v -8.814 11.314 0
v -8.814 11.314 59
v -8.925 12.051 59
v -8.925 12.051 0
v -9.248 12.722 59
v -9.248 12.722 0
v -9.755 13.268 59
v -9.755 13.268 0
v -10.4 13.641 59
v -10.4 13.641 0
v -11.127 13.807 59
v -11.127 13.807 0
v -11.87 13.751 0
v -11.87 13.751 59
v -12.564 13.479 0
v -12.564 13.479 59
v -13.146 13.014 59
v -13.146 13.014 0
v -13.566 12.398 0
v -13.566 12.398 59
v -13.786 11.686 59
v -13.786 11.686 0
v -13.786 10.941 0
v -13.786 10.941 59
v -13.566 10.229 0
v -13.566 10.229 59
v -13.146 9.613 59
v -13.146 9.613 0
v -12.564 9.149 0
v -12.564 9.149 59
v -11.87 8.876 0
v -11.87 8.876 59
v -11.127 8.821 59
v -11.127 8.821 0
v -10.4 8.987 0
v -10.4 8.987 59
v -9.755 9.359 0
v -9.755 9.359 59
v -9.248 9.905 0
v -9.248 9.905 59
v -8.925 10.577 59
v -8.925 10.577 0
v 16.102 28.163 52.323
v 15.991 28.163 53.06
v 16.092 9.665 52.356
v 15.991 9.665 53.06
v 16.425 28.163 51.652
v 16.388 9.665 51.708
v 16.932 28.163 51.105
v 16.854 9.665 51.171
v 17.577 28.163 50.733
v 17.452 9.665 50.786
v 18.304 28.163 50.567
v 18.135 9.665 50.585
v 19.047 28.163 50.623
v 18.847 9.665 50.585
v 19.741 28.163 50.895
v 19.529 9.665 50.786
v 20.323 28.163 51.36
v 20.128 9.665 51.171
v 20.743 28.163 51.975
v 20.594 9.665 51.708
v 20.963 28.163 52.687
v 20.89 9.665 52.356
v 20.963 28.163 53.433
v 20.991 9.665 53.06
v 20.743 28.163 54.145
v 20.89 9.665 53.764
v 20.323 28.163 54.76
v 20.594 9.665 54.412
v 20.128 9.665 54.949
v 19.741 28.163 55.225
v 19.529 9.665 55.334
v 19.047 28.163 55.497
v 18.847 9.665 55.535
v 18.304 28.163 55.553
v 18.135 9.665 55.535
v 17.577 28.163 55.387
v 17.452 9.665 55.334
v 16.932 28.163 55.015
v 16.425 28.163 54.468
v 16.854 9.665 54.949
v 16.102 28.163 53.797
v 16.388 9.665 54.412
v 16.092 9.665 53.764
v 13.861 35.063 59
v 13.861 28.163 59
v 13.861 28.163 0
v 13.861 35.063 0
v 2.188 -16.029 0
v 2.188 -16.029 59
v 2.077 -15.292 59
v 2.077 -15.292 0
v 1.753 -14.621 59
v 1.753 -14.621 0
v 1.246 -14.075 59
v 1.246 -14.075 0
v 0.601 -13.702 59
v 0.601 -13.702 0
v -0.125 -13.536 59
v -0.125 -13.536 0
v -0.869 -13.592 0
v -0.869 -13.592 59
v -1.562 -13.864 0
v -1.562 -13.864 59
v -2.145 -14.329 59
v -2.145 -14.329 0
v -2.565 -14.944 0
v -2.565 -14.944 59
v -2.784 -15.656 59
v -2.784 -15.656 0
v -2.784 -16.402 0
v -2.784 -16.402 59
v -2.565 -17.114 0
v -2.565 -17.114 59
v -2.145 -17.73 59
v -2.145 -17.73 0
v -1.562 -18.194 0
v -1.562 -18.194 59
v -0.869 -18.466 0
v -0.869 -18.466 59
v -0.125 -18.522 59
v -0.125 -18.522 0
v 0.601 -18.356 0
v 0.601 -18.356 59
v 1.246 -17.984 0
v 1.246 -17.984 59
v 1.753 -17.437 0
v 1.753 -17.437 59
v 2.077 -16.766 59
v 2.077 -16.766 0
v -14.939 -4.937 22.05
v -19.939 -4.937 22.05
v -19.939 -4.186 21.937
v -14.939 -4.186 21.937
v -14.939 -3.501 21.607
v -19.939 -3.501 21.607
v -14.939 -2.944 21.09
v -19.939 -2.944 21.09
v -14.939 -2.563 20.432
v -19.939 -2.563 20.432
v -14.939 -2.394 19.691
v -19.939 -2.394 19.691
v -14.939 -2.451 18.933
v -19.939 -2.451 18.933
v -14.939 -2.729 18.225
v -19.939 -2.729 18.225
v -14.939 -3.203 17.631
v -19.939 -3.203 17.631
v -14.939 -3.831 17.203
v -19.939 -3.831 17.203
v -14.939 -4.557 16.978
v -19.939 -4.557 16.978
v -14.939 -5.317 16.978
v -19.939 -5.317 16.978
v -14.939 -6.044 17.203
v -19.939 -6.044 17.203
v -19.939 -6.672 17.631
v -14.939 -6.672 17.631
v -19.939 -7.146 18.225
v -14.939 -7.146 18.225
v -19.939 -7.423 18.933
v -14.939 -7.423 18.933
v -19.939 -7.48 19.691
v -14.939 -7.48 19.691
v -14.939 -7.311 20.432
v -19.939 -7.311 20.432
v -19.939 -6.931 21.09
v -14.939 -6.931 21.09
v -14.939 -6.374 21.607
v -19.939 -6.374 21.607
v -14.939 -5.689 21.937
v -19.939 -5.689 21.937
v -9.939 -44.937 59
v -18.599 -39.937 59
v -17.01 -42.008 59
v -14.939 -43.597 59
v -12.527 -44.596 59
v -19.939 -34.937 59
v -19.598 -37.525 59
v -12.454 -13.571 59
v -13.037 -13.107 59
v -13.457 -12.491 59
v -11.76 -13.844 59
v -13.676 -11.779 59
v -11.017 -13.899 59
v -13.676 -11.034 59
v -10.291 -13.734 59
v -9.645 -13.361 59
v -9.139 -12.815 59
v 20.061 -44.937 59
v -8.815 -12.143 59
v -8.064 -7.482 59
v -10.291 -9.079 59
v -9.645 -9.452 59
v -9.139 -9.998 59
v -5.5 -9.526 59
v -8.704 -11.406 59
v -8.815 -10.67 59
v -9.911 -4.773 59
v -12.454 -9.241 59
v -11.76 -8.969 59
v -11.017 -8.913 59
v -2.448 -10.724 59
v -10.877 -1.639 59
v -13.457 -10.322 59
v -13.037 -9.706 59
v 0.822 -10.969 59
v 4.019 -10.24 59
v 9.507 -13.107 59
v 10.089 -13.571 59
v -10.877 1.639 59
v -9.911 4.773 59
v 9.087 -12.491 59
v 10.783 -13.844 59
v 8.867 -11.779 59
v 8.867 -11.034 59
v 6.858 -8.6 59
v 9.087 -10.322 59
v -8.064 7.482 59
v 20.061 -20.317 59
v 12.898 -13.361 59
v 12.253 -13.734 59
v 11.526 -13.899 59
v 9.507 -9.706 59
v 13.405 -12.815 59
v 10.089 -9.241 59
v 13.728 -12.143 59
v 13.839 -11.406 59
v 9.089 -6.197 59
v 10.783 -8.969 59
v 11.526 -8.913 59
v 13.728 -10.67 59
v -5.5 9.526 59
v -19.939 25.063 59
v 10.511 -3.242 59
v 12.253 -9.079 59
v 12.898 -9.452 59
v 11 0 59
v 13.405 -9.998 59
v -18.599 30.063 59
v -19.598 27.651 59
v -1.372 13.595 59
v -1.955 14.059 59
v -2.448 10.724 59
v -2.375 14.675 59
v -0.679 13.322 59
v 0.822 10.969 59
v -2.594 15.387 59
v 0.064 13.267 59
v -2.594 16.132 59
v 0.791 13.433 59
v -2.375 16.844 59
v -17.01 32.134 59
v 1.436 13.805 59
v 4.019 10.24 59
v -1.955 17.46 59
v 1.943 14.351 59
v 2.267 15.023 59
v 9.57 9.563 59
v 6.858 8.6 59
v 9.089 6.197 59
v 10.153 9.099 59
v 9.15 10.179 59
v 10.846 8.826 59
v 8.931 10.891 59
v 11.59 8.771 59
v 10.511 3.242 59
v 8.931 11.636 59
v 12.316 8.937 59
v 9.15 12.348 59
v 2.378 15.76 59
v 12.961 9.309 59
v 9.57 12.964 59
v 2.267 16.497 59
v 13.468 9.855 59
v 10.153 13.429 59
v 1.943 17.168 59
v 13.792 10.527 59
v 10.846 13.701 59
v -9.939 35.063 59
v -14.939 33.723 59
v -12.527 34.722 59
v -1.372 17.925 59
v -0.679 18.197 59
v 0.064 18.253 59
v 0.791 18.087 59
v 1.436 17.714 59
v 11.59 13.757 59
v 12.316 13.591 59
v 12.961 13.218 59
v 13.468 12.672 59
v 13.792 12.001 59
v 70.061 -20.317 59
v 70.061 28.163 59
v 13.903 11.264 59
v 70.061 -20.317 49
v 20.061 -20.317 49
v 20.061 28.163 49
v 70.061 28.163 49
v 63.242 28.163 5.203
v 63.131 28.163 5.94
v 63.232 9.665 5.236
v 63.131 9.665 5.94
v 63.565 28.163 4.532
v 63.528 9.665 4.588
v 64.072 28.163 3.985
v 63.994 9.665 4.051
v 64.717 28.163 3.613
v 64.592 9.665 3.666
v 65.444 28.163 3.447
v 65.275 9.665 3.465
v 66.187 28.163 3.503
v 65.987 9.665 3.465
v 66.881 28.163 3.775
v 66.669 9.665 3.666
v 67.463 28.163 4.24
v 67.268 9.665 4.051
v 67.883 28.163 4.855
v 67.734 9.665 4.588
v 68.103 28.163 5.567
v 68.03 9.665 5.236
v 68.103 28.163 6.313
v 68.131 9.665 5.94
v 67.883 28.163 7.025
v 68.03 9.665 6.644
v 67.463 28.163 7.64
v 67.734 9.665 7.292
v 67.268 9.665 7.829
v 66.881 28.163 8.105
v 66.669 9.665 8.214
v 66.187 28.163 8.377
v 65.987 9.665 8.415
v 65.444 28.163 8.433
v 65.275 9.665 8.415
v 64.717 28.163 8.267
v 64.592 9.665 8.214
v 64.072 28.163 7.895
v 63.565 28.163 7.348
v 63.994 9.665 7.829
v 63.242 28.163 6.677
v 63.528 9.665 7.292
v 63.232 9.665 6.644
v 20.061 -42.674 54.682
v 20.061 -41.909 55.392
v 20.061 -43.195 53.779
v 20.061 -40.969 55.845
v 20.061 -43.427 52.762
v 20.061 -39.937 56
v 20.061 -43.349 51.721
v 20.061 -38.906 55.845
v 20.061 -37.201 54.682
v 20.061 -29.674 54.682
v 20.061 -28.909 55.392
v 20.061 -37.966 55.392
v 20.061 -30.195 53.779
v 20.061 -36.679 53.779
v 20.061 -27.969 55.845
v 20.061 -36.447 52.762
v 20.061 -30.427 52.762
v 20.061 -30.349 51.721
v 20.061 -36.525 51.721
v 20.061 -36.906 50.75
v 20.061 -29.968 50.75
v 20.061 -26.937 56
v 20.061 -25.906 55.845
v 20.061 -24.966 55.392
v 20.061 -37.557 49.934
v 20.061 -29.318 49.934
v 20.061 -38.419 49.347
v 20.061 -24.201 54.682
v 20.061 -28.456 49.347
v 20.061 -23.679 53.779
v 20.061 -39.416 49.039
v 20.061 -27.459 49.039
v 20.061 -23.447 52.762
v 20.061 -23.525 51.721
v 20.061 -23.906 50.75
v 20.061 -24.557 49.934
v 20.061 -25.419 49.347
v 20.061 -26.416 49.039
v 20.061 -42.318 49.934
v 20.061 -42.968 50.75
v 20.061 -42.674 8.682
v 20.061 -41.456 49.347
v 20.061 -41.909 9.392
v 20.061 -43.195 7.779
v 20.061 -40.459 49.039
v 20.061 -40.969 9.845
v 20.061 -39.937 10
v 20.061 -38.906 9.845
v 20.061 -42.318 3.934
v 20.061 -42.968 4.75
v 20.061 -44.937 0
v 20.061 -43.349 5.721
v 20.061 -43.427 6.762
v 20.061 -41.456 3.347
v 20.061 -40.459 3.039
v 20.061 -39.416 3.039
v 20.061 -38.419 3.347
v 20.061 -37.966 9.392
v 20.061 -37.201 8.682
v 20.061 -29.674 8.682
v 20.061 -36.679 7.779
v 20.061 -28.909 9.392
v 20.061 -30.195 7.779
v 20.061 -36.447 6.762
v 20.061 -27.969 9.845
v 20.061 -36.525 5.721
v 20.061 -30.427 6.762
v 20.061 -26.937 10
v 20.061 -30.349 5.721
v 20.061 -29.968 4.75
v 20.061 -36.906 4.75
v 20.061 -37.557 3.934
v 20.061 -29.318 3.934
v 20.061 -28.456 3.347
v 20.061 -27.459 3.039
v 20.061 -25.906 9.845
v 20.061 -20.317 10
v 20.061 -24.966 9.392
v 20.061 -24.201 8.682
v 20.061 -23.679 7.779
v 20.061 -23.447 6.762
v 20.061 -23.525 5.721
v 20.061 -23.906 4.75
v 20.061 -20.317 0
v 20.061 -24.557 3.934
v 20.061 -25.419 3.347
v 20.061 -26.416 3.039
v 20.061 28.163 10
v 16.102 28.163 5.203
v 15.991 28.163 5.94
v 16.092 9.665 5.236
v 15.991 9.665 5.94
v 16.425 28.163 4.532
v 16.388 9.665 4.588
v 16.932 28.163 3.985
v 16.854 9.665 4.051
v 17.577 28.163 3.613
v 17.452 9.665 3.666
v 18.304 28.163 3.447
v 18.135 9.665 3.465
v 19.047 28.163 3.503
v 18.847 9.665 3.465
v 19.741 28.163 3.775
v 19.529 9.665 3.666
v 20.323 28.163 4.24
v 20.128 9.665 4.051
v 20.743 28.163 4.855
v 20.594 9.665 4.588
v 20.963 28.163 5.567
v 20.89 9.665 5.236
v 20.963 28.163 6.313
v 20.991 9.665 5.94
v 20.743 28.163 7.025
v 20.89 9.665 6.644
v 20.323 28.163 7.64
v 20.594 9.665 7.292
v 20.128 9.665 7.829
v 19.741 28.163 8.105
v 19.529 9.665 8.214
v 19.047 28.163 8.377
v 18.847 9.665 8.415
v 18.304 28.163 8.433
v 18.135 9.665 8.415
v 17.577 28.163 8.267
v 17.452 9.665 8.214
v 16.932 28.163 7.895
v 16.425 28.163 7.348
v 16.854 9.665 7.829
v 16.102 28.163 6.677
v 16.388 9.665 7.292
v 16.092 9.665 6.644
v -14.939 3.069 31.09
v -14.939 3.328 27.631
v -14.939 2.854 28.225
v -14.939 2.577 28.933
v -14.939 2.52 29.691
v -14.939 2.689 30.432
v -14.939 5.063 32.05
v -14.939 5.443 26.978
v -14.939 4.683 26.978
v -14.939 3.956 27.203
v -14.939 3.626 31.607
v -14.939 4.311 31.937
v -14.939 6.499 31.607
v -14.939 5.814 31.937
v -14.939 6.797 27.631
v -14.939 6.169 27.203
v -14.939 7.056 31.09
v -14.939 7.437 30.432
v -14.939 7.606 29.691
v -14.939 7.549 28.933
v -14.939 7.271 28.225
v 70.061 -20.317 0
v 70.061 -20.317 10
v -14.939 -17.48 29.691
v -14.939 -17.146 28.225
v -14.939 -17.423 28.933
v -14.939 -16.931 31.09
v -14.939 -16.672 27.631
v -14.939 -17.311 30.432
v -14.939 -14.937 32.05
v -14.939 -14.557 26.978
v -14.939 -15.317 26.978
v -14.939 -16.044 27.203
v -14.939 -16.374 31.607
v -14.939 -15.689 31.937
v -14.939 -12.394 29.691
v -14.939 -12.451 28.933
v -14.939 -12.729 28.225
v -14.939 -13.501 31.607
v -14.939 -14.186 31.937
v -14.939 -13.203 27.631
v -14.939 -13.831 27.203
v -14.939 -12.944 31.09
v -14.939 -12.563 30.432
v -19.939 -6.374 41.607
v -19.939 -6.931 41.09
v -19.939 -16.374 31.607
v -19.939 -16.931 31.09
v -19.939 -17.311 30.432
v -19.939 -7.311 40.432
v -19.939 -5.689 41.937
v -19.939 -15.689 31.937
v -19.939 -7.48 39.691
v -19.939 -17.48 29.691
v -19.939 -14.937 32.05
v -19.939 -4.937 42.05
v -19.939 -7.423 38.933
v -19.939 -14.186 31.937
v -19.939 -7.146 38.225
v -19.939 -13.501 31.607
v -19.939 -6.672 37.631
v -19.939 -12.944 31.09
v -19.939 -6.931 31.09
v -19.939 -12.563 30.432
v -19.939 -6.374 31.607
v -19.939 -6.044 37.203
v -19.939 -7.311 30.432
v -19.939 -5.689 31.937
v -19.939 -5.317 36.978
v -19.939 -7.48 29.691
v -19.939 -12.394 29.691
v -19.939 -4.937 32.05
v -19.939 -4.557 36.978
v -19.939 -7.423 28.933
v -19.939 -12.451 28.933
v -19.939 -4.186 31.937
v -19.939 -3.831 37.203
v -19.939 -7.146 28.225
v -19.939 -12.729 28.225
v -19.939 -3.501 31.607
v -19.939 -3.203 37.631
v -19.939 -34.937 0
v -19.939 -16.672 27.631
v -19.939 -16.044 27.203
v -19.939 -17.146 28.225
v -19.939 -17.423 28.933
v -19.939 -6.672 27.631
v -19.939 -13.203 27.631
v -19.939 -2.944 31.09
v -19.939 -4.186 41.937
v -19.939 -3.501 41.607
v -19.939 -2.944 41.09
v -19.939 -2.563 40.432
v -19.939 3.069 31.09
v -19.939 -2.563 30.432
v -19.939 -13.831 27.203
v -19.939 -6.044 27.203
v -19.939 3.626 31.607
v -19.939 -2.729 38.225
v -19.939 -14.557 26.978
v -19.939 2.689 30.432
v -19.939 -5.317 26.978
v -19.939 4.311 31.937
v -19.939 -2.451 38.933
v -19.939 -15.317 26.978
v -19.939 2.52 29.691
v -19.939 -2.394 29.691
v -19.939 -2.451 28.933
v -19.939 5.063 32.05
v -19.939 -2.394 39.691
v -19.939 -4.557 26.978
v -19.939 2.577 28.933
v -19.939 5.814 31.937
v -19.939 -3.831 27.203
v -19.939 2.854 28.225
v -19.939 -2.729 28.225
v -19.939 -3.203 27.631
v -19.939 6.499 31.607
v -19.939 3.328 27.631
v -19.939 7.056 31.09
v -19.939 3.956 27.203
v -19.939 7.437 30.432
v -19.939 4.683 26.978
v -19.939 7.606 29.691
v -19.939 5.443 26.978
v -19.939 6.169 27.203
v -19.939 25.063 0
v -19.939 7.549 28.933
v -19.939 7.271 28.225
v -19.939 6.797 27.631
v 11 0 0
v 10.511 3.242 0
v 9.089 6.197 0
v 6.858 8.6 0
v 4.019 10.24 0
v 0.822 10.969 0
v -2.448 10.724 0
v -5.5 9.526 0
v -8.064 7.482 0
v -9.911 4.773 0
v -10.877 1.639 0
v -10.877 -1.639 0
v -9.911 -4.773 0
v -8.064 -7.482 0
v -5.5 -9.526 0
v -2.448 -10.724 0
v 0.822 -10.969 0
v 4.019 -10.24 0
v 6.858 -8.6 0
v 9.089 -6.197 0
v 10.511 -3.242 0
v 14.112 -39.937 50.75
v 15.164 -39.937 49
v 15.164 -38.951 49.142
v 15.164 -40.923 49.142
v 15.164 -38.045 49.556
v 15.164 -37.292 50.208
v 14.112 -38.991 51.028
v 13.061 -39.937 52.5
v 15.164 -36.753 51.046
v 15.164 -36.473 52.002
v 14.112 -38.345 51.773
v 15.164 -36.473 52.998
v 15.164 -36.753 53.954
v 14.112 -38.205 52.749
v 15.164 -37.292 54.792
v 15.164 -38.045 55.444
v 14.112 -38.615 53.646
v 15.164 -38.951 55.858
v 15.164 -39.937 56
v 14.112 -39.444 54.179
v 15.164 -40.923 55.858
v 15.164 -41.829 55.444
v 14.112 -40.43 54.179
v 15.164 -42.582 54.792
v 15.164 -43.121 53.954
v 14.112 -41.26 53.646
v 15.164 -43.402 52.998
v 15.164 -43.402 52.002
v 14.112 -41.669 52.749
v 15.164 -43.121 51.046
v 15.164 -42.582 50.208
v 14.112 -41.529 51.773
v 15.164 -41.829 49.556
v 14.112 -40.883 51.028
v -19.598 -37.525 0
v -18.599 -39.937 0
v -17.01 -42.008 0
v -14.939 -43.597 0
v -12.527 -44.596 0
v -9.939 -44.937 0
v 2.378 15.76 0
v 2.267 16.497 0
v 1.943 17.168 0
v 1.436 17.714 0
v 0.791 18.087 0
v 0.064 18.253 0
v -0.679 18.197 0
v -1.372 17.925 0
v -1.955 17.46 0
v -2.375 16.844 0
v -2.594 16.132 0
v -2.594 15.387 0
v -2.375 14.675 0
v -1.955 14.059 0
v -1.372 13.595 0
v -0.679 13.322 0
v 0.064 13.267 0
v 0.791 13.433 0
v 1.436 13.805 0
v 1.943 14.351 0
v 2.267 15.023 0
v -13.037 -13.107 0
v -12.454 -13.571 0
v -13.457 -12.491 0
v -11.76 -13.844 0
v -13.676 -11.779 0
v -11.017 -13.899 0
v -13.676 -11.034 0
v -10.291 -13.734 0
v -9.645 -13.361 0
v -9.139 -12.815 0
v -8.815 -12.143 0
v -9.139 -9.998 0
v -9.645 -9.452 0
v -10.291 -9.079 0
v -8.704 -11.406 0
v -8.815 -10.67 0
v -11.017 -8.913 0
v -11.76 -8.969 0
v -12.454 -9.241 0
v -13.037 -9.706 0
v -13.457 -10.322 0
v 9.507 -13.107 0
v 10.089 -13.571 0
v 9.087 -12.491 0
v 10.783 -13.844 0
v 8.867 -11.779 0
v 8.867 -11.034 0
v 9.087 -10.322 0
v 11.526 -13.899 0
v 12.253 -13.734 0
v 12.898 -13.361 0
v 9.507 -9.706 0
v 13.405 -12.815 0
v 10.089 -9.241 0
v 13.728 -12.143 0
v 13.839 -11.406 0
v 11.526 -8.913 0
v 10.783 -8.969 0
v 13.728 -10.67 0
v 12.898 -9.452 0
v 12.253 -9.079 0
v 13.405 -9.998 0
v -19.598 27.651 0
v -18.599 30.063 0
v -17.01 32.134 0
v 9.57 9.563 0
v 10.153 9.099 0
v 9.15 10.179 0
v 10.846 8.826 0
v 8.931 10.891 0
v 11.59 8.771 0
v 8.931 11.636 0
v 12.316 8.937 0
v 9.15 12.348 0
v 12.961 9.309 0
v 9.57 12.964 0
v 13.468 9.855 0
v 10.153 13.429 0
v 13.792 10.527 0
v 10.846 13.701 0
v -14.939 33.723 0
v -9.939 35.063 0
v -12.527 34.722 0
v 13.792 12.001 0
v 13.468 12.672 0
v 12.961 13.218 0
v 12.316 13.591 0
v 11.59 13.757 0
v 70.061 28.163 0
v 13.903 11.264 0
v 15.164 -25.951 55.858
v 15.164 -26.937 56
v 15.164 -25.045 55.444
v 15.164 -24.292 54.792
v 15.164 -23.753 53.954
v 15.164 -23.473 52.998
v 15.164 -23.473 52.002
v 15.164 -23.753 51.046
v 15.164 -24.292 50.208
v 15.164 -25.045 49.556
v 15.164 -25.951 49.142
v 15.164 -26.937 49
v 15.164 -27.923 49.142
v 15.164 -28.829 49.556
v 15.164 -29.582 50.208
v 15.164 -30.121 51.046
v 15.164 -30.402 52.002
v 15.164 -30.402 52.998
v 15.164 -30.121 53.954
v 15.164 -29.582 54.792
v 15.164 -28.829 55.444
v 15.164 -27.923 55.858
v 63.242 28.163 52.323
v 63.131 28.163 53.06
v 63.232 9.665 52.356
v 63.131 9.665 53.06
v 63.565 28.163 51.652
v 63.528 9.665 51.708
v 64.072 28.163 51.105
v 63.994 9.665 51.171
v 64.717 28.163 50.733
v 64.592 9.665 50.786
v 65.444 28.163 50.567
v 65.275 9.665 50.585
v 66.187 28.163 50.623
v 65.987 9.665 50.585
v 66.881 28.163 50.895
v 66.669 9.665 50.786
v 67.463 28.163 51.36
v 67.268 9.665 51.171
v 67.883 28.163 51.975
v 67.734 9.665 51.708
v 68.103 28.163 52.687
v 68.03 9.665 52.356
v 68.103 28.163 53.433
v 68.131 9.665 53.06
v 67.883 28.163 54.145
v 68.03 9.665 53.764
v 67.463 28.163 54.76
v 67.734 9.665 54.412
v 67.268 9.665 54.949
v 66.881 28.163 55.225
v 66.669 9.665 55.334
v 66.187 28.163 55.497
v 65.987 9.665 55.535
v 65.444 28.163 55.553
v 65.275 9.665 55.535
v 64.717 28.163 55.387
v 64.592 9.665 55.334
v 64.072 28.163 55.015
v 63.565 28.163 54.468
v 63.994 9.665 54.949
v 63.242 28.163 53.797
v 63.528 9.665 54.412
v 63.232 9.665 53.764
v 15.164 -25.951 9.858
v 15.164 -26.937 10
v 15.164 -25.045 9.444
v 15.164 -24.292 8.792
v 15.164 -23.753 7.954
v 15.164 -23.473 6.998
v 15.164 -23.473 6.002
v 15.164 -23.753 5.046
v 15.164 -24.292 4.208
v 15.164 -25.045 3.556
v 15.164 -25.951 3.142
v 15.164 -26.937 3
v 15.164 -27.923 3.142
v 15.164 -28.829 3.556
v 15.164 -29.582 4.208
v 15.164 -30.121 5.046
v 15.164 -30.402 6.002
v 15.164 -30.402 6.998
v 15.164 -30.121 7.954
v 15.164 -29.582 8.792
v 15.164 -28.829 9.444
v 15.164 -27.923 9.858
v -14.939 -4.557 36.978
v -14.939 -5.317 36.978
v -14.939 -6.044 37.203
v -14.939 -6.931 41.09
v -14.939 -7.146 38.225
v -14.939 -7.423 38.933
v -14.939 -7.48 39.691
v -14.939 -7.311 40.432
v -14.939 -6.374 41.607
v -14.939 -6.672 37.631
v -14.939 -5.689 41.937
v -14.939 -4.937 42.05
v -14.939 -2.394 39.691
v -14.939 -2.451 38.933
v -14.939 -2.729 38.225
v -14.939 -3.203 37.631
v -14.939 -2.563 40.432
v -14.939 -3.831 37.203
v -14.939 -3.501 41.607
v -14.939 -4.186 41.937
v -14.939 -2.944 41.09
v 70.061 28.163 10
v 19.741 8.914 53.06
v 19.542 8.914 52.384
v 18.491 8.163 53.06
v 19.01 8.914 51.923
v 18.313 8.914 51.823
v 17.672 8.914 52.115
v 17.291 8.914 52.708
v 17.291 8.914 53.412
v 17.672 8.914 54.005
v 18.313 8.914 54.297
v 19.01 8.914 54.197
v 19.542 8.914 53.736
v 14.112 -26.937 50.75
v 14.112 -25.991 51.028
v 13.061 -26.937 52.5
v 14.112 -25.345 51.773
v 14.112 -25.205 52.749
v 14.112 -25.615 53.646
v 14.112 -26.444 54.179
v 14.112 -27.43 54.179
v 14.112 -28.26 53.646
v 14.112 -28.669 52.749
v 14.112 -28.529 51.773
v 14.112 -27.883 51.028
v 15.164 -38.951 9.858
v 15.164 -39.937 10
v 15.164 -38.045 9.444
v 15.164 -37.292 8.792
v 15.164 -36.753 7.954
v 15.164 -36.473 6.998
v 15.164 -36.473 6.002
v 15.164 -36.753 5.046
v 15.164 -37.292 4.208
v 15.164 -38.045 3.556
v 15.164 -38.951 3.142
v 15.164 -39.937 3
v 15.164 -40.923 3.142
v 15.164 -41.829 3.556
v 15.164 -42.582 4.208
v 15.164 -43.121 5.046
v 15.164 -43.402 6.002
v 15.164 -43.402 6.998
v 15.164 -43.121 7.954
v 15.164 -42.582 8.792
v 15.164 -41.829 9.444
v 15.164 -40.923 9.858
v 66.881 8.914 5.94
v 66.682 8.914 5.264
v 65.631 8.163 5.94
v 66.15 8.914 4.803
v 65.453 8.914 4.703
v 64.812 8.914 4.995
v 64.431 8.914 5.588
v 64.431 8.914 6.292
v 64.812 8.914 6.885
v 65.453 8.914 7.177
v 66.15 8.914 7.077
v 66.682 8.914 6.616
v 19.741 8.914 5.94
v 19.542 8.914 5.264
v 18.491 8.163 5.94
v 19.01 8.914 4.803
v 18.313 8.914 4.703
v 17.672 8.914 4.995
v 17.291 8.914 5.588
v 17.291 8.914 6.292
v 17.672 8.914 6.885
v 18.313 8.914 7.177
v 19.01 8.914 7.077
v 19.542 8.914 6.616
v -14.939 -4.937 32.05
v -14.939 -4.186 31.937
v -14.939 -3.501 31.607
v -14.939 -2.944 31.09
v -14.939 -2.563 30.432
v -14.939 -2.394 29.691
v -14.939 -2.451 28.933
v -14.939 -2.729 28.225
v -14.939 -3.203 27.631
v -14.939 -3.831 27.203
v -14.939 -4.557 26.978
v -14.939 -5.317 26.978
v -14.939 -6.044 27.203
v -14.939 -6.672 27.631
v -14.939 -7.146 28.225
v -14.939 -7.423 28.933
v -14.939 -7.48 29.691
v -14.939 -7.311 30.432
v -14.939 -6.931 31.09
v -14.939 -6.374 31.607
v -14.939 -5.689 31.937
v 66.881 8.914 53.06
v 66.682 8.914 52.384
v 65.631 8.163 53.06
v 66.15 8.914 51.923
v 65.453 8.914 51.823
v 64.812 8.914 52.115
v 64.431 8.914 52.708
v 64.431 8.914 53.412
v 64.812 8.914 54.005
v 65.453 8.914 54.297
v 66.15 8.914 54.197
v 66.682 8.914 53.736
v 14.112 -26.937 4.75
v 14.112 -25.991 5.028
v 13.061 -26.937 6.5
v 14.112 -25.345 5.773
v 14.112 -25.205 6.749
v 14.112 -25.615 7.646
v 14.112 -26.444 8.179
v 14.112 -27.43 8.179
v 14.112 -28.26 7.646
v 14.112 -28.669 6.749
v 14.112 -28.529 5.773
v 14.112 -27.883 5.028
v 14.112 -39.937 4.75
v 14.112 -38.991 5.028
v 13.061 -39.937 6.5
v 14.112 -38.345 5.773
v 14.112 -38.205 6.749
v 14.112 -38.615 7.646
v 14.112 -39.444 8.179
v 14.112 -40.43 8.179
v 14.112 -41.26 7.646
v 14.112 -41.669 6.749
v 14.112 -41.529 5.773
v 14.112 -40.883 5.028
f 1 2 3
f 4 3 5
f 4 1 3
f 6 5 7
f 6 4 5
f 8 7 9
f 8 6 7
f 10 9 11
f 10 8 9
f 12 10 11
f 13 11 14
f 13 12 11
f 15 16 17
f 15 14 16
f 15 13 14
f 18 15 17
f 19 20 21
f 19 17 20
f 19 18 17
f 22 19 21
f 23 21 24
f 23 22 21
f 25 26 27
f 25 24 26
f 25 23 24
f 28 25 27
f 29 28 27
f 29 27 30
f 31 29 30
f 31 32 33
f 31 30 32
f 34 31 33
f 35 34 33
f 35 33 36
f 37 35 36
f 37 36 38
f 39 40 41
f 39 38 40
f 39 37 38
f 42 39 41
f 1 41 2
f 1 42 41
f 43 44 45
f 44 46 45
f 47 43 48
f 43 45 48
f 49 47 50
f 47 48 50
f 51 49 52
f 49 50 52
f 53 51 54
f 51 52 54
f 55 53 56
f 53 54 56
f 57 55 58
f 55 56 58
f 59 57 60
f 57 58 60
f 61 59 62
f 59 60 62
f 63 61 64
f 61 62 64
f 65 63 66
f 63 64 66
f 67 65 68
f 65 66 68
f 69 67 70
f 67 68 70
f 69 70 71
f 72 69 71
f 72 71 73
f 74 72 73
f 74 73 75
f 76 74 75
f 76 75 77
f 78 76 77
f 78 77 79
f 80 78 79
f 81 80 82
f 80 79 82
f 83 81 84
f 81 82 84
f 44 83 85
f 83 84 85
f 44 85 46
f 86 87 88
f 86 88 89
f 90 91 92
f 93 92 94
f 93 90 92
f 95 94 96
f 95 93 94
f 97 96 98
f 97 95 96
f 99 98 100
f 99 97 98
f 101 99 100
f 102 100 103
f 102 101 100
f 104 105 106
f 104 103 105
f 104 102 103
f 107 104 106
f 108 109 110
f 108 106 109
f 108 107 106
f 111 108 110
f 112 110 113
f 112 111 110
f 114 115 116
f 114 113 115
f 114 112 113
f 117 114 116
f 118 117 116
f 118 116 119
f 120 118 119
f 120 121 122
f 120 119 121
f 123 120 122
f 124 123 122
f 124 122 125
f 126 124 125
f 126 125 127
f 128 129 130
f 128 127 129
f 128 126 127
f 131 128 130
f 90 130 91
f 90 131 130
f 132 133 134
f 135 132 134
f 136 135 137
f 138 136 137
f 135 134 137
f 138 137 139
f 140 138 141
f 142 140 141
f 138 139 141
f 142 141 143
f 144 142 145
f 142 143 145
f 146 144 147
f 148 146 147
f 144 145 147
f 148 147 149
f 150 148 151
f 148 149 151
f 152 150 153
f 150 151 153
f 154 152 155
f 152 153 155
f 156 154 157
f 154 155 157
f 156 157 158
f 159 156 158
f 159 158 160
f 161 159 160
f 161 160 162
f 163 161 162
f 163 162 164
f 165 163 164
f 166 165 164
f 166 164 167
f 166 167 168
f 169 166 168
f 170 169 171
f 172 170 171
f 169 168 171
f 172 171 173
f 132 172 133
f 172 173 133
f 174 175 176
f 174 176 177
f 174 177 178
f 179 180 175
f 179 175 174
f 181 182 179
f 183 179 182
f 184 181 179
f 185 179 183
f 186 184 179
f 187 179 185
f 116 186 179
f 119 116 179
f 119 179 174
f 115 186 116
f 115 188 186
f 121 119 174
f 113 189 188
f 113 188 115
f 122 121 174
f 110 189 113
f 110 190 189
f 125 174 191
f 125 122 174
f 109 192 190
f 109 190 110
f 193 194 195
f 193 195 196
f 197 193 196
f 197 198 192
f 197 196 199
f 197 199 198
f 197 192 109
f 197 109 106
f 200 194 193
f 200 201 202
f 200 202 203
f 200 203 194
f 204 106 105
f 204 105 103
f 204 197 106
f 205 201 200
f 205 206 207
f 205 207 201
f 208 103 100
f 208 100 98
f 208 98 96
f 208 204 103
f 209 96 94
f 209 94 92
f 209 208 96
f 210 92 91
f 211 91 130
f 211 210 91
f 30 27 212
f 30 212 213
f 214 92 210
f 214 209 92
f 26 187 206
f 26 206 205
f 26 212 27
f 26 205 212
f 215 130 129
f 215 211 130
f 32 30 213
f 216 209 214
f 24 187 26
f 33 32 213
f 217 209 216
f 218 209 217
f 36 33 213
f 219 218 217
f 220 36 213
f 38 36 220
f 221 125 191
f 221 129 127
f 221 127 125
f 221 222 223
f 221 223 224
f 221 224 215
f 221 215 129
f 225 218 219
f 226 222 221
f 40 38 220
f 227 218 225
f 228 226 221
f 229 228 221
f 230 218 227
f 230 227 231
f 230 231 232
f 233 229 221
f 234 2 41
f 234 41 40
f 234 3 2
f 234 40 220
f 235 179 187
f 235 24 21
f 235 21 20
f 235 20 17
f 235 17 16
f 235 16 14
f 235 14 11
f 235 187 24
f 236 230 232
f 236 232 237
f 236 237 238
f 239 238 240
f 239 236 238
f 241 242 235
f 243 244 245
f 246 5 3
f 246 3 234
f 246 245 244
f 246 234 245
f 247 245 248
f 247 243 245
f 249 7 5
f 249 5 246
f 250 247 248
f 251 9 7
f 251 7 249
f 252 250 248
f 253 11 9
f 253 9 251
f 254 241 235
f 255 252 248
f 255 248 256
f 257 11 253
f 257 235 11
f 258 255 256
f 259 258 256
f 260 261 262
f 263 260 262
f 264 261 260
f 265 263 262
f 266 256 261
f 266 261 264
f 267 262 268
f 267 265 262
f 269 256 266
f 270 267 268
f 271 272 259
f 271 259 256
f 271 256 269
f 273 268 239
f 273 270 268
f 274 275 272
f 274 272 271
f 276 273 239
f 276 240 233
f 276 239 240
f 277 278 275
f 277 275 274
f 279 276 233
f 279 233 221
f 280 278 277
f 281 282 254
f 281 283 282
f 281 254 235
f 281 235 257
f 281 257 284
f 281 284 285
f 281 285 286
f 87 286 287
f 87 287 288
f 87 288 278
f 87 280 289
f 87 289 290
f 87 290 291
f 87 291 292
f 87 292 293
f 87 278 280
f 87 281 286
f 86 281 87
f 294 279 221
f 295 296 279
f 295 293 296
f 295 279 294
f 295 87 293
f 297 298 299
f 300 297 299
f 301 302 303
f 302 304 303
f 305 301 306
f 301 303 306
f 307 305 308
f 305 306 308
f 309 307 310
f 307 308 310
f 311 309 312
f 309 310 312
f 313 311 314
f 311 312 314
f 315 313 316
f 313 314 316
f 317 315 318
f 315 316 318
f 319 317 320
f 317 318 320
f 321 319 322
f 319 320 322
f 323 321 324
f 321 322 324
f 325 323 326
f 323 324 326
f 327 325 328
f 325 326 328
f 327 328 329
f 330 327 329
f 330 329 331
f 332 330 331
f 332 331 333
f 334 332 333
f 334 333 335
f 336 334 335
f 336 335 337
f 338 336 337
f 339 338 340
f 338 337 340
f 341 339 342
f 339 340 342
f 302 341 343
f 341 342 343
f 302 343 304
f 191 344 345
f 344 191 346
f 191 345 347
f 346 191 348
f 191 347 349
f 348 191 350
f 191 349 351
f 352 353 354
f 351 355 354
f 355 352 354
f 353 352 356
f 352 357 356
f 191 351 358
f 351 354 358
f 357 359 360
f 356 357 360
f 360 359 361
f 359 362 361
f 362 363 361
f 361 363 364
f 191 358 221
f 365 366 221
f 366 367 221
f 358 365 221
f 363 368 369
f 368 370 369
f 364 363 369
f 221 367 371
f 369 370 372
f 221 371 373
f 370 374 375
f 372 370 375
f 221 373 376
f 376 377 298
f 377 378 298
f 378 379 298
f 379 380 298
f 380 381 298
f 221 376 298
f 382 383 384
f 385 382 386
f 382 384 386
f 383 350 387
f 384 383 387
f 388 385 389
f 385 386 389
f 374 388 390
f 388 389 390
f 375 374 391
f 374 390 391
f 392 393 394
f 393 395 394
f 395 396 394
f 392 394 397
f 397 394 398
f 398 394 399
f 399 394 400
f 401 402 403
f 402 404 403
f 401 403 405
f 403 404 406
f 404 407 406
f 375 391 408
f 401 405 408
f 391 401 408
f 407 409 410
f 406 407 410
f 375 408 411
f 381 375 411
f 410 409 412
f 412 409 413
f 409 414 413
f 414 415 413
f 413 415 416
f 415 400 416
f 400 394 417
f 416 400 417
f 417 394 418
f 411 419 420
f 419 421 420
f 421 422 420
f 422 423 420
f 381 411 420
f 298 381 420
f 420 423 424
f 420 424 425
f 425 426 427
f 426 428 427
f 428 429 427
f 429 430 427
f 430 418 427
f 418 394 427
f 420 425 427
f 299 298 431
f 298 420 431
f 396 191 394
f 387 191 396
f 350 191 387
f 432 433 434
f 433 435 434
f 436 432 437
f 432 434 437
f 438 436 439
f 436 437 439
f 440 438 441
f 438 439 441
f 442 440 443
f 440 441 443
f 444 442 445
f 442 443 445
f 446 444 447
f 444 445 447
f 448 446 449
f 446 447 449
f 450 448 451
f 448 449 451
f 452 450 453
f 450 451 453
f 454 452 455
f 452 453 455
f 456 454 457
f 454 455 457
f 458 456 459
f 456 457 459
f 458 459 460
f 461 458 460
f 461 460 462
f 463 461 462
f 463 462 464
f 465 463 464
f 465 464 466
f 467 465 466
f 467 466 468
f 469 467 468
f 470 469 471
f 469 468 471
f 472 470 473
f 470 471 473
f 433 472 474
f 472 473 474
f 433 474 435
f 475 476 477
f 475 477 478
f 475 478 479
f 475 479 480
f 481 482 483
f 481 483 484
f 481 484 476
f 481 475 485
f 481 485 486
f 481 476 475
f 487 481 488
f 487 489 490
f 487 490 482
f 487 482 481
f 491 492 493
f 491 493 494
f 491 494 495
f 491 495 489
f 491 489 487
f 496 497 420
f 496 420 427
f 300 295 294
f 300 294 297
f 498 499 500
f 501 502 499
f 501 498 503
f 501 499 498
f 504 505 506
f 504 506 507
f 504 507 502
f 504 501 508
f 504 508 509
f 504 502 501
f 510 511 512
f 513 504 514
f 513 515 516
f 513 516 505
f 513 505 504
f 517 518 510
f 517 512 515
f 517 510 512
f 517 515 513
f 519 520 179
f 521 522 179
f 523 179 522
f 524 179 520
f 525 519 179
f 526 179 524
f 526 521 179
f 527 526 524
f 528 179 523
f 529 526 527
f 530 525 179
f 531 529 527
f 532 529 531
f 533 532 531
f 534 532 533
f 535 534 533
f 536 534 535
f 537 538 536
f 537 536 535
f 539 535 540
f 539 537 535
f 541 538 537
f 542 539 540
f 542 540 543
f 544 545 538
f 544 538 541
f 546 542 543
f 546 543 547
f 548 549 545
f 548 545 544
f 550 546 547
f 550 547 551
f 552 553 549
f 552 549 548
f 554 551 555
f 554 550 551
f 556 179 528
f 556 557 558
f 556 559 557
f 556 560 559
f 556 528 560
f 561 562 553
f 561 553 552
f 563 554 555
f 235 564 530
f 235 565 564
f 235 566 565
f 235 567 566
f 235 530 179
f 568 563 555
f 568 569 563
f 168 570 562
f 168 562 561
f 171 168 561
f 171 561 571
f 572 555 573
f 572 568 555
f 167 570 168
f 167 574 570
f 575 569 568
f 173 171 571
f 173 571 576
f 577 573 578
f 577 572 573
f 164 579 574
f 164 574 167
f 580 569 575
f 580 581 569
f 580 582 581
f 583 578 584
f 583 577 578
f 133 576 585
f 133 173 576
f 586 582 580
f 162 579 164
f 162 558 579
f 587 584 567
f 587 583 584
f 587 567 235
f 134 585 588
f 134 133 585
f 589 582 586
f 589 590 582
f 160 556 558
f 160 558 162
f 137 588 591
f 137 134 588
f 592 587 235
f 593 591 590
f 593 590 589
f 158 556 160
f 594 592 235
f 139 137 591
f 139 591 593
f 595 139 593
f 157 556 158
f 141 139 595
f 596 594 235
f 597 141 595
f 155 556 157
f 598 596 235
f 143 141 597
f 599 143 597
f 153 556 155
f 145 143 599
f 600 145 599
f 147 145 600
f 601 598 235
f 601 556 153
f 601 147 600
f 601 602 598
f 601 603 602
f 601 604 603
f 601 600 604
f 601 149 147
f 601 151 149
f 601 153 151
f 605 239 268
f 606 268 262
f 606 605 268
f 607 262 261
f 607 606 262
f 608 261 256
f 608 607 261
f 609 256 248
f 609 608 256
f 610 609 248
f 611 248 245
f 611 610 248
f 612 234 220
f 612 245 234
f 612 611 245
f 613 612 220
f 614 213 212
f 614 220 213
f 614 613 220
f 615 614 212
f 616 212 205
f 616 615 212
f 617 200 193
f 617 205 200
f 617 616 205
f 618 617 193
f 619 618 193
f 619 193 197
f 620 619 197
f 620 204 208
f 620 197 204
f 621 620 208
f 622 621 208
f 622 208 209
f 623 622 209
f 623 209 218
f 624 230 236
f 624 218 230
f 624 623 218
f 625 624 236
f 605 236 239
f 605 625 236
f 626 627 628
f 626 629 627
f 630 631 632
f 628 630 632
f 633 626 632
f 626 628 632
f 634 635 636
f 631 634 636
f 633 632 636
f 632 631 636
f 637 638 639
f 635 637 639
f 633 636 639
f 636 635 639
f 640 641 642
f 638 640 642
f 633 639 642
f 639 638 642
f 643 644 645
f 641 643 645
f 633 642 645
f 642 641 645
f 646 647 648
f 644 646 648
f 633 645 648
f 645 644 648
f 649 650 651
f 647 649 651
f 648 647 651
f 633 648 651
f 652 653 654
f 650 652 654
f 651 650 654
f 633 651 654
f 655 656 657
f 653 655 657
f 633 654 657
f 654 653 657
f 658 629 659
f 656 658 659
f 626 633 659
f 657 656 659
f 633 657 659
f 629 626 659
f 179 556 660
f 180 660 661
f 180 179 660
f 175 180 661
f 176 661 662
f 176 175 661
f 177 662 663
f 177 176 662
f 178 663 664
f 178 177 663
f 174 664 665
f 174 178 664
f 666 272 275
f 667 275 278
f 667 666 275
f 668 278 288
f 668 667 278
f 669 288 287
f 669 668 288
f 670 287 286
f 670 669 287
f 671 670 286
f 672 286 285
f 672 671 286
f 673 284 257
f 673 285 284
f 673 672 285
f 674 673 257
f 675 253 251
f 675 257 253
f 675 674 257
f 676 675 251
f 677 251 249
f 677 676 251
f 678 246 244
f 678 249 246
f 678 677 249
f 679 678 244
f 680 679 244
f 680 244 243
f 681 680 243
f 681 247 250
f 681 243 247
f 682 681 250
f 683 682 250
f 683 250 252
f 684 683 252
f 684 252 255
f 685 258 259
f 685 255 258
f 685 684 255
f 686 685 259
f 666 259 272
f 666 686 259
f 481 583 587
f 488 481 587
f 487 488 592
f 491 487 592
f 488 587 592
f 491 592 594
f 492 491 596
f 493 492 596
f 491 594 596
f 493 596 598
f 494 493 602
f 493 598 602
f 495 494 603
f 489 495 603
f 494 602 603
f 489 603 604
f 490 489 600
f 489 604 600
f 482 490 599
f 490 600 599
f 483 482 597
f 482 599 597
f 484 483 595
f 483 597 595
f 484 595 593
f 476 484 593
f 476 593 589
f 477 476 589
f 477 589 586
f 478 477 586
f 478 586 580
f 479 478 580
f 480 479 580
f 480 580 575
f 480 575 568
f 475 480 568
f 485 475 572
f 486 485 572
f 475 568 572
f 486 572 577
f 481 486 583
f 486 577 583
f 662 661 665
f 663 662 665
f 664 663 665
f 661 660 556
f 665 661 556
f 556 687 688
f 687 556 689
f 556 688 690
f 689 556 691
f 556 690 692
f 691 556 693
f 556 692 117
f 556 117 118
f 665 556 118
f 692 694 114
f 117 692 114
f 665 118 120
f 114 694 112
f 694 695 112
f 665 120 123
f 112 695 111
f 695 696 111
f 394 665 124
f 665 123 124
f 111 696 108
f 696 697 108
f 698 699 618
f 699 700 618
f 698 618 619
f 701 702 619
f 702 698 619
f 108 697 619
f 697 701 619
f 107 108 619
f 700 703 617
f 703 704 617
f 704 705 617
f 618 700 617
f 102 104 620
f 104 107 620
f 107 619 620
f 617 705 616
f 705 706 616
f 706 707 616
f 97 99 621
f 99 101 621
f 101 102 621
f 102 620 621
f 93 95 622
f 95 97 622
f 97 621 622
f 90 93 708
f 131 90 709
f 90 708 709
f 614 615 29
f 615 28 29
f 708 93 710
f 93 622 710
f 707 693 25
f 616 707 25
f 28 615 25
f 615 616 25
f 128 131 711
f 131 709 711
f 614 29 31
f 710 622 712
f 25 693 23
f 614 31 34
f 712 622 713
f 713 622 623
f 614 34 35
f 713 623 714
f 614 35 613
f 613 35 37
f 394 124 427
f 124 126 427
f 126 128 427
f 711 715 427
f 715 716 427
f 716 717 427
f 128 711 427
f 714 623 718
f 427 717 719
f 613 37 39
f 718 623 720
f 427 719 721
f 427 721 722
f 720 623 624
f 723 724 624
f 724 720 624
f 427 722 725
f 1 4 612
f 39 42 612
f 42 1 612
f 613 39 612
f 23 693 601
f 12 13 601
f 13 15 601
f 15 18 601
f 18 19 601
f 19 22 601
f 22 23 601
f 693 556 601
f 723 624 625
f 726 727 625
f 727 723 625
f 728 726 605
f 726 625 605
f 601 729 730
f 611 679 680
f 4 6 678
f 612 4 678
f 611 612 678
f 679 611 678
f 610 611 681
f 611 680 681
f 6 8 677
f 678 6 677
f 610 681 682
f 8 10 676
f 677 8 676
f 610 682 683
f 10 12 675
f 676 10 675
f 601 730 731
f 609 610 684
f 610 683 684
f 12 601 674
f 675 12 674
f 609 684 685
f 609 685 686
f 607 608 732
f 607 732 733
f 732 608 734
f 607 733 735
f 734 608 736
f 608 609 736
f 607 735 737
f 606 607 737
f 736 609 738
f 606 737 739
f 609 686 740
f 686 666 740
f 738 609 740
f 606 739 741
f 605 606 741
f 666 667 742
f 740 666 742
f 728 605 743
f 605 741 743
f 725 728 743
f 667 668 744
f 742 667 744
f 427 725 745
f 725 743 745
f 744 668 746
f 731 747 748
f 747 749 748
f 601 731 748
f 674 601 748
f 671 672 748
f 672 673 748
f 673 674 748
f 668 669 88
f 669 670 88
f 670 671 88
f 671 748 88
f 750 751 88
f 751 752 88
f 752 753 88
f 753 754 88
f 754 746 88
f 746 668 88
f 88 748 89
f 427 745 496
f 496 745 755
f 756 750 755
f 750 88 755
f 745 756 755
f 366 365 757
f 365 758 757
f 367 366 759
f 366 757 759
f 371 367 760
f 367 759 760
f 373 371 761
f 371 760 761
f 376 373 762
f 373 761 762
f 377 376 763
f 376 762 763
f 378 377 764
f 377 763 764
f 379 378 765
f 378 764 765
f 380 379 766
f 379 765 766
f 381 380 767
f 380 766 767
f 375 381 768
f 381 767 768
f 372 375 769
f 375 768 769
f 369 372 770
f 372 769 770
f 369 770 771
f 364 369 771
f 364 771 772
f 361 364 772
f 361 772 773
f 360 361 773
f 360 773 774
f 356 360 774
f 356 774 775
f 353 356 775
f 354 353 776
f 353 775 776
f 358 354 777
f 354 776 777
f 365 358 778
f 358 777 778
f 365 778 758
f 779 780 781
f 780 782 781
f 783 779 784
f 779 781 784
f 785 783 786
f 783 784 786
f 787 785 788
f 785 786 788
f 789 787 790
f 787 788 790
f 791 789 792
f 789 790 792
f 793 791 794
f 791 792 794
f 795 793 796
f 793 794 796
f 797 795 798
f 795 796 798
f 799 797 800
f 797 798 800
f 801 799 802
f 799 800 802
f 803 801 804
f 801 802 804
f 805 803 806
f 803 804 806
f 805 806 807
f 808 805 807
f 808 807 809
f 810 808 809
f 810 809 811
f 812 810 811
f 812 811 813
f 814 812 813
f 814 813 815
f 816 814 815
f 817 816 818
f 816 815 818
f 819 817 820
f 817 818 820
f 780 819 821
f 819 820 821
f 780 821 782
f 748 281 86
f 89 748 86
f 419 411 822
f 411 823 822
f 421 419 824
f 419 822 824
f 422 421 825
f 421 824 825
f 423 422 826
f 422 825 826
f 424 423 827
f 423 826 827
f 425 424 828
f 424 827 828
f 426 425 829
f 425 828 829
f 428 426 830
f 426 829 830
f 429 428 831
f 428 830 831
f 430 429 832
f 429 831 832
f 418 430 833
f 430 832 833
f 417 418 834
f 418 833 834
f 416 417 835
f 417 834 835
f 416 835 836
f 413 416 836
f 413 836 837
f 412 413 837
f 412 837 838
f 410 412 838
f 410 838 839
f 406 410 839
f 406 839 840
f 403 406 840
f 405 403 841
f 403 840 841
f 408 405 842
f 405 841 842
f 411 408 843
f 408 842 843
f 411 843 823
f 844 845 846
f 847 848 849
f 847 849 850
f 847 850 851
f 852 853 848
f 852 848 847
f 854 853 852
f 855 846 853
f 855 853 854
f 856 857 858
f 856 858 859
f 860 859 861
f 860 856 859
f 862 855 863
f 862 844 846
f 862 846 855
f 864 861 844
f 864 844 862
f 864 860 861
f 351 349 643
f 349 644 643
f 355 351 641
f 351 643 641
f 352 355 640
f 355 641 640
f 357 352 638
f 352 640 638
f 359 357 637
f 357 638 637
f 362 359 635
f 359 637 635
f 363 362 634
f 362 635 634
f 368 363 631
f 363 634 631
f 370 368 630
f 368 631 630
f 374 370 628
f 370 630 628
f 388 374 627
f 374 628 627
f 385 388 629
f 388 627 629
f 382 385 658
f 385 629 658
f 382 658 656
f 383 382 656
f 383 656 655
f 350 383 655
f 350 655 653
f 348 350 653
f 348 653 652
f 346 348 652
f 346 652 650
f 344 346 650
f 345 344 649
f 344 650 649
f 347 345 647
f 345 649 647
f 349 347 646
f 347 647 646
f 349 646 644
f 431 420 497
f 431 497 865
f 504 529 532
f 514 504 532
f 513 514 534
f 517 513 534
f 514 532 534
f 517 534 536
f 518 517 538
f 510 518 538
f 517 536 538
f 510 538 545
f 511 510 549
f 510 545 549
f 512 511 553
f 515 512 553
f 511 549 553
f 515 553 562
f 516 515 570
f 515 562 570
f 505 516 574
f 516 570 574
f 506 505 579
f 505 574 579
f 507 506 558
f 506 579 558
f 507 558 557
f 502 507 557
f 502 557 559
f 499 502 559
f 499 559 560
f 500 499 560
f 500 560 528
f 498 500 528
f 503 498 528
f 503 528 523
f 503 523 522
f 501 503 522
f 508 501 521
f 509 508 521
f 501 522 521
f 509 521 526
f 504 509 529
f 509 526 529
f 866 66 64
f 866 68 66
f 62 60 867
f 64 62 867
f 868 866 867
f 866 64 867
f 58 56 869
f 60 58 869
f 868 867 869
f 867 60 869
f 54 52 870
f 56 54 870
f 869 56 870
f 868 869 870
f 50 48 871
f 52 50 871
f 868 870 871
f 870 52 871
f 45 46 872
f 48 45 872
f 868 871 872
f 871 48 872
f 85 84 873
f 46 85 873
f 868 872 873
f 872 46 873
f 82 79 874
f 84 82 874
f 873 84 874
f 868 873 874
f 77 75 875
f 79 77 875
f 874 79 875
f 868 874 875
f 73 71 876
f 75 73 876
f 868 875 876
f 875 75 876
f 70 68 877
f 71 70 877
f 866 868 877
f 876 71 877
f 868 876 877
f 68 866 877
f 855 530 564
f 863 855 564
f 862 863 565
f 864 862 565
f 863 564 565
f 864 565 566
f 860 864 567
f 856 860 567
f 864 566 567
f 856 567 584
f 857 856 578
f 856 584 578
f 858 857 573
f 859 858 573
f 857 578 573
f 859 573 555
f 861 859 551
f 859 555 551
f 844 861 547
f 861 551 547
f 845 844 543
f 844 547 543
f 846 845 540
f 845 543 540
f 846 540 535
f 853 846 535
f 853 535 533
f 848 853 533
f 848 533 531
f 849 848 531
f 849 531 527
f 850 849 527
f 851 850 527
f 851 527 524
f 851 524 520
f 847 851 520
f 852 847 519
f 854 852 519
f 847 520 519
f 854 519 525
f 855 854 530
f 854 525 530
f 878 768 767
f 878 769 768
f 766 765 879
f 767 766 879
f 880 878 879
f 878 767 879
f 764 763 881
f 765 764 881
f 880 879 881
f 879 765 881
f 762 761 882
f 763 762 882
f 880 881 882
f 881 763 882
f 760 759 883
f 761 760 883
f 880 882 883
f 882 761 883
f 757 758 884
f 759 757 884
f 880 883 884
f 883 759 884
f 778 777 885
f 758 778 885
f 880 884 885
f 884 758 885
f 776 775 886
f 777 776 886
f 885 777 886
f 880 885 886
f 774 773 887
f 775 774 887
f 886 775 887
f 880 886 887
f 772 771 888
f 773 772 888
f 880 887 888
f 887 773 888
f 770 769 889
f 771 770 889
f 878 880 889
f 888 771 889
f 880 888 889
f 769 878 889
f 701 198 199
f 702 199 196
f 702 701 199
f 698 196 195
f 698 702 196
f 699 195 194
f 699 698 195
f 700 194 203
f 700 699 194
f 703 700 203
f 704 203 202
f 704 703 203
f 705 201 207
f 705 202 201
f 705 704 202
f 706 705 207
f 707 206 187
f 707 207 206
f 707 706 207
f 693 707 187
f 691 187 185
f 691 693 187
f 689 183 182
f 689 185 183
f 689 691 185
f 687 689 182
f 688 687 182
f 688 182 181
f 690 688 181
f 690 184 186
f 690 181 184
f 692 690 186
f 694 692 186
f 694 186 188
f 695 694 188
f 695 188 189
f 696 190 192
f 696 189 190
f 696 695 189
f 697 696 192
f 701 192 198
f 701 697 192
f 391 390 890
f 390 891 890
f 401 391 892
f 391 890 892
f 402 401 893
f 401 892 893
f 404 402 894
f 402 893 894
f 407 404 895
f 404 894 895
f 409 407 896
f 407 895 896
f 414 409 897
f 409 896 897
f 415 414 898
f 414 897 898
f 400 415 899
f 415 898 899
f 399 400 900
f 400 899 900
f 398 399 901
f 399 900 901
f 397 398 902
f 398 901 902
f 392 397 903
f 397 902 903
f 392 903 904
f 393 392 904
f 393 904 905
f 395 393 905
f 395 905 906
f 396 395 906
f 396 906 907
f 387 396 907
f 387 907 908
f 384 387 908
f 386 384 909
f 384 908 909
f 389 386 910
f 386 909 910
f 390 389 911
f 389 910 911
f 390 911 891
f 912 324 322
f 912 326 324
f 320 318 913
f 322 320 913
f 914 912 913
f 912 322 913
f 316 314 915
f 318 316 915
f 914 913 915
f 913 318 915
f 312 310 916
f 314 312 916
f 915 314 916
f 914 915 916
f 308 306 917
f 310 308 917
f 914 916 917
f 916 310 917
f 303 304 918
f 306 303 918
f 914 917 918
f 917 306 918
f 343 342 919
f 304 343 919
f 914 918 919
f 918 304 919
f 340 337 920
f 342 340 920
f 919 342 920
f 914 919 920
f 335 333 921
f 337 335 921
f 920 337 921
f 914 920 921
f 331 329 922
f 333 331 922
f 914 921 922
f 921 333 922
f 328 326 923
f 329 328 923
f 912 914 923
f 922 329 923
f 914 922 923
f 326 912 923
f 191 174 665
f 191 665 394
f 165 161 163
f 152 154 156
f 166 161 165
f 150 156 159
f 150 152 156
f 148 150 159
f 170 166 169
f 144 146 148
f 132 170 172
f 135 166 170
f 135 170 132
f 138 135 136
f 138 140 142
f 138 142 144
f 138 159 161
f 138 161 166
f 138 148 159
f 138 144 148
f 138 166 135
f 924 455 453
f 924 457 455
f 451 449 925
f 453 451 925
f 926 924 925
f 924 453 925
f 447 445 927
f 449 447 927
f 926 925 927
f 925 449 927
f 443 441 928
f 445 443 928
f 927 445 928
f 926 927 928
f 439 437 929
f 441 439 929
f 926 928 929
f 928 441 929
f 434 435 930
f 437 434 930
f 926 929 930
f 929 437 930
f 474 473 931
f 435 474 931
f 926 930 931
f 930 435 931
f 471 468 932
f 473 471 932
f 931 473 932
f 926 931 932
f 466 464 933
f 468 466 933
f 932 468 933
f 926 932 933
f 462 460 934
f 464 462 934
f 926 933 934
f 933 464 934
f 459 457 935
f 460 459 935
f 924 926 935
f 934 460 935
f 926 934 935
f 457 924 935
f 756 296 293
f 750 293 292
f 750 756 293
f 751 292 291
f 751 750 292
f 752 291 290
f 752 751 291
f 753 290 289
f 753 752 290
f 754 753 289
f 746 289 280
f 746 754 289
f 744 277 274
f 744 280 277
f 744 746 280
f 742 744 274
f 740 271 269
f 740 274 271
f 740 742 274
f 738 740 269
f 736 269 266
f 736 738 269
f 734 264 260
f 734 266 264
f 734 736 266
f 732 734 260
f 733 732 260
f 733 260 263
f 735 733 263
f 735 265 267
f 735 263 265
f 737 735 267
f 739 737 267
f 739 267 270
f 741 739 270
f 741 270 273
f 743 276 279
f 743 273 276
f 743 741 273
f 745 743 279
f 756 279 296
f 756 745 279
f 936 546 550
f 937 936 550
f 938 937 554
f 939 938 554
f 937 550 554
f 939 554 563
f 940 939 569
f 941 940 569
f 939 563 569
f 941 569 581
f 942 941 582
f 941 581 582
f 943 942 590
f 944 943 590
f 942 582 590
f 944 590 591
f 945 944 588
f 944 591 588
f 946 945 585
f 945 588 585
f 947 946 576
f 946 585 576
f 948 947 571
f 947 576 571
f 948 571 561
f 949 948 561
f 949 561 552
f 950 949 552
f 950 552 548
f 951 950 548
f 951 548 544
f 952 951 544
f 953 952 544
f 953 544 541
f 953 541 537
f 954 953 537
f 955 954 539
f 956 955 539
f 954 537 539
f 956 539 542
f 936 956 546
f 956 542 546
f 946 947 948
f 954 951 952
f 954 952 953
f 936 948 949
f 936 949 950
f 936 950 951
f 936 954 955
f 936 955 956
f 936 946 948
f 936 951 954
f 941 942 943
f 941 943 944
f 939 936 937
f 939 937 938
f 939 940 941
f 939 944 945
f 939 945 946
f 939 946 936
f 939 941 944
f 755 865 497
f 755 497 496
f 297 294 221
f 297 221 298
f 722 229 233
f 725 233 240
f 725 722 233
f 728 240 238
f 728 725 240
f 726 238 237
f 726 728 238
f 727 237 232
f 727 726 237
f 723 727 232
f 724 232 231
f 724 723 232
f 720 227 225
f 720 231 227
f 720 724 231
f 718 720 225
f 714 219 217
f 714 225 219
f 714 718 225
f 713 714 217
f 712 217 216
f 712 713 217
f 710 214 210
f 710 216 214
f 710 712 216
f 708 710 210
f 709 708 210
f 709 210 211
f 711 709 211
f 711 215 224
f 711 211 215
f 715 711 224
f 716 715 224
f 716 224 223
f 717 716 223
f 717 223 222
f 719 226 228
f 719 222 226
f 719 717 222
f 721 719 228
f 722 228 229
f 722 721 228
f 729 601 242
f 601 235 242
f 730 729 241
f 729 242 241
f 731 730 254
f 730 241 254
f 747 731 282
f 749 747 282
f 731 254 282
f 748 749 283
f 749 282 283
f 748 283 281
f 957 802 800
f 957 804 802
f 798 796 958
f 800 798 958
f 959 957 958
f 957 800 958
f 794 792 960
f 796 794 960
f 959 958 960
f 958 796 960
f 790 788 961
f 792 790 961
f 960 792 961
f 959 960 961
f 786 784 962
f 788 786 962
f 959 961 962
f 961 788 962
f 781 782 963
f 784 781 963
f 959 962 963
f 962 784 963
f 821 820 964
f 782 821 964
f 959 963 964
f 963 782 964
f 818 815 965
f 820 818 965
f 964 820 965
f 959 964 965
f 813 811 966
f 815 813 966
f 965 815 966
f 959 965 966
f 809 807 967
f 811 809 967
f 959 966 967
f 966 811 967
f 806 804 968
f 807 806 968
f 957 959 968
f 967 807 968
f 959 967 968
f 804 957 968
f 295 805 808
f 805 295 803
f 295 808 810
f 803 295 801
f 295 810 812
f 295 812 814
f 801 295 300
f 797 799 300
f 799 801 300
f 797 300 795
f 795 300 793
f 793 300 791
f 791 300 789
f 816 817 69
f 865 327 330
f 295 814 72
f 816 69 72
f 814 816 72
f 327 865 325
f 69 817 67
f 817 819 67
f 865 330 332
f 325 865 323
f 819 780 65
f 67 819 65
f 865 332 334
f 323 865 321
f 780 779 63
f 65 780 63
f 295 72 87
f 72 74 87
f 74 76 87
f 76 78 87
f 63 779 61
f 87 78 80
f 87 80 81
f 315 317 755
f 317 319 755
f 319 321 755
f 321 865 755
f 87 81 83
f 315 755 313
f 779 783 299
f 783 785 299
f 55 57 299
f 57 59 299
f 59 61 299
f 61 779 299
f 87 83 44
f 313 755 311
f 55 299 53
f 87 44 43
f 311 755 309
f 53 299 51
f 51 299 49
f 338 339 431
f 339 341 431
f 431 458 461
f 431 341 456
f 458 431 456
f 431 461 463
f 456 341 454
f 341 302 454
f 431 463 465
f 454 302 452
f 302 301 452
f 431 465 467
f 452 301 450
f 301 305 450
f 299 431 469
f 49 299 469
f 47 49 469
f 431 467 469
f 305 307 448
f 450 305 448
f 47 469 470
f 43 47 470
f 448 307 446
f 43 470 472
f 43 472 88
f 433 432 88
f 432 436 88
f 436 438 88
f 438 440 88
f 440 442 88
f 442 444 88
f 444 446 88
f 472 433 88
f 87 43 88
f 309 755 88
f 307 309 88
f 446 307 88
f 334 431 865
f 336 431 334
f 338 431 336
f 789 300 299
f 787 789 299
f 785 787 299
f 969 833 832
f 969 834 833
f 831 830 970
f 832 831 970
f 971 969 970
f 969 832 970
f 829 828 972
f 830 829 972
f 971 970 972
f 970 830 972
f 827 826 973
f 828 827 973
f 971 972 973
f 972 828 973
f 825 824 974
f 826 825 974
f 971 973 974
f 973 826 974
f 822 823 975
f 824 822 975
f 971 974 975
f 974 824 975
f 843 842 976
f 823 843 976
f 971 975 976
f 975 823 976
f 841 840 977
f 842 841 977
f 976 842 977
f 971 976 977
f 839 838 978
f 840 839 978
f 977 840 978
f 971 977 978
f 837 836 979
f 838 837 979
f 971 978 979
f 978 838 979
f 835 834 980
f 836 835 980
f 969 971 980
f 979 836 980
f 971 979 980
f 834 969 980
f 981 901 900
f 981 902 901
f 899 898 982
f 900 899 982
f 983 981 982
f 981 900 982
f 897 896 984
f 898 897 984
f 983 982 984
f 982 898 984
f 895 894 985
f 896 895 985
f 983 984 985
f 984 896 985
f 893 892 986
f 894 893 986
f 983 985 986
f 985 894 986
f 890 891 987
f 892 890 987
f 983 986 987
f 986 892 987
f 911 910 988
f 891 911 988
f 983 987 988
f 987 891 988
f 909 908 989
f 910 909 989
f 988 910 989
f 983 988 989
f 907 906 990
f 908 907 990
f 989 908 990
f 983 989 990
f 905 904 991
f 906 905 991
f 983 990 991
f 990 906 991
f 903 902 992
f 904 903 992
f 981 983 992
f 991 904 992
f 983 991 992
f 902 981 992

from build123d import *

# Parameters (mm, degrees)
SKETCH1_W                    = 40
SKETCH1_H                    = 80
BOSS_EXTRUDE1_DEPTH          = 59
SKETCH2_R                    = 11
SKETCH2_R_2                  = 2.5
CUT_EXTRUDE1_DEPTH           = 77.829612465
SKETCH5_R                    = 2.55
CUT_EXTRUDE3_DEPTH           = 5
FILLET3_R                    = 10
FILLET4_R                    = 10
F_7_0_7_DIAMETER_HOLE1_D     = 7
F_7_0_7_DIAMETER_HOLE1_DEPTH = 4.896987833
F_7_0_7_DIAMETER_HOLE1_TIP   = 2.103012167
SKETCH13_W                   = 10
SKETCH13_H                   = 48.48
BOSS_EXTRUDE2_DEPTH          = 50
SKETCH18_W                   = 6.2
SKETCH18_H                   = 6.9
CUT_EXTRUDE4_DEPTH           = 103.023881602
F_5_0_5_DIAMETER_HOLE1_D     = 5
F_5_0_5_DIAMETER_HOLE1_DEPTH = 18.497848452
F_5_0_5_DIAMETER_HOLE1_TIP   = 1.502151548


with BuildPart() as part:
    # Sketch1 → Boss-Extrude1 (new body)
    with BuildSketch(Plane.XY):
        with Locations((0.060830656, -4.937205352)):
            Rectangle(SKETCH1_W, SKETCH1_H)
    extrude(amount=BOSS_EXTRUDE1_DEPTH)

    # Sketch2 → Cut-Extrude1 (cut, through all)
    with BuildSketch(Plane.XY):
        Circle(SKETCH2_R)
        with Locations((-11.313708499, 11.313708499)):
            Circle(SKETCH2_R_2)
        with Locations((-0.122338904, 15.759725587)):
            Circle(SKETCH2_R_2)
        with Locations((11.402693442, 11.263696484)):
            Circle(SKETCH2_R_2)
        with Locations((11.339369089, -11.406422087)):
            Circle(SKETCH2_R_2)
        with Locations((-0.312311964, -16.029099896)):
            Circle(SKETCH2_R_2)
        with Locations((-11.204100775, -11.406422087)):
            Circle(SKETCH2_R_2)
    extrude(amount=CUT_EXTRUDE1_DEPTH, mode=Mode.SUBTRACT)

    # Sketch5 → Cut-Extrude3 (cut)
    with BuildSketch(Plane.ZY.offset(19.939169344)):
        with Locations((29.5, -4.937205352)):
            Circle(SKETCH5_R)
        with Locations((39.5, -4.937205352)):
            Circle(SKETCH5_R)
        with Locations((19.5, -4.937205352)):
            Circle(SKETCH5_R)
        with Locations((29.5, 5.062794648)):
            Circle(SKETCH5_R)
        with Locations((29.5, -14.937205352)):
            Circle(SKETCH5_R)
    extrude(amount=-CUT_EXTRUDE3_DEPTH, mode=Mode.SUBTRACT)

    # Fillet3
    fillet3_edges = [part.edges().sort_by_distance(p)[0] for p in [
        (-19.939169344, -44.937205352, 29.5),
    ]]
    fillet(fillet3_edges, radius=FILLET3_R)

    # Fillet4
    fillet4_edges = [part.edges().sort_by_distance(p)[0] for p in [
        (-19.939169344, 35.062794648, 29.5),
    ]]
    fillet(fillet4_edges, radius=FILLET4_R)

    # Ø7.0 (7) Diameter Hole1
    with Locations(Plane(origin=(20.060830656, 0, 0), x_dir=(0, 0, -1), z_dir=(1, 0, 0))):
        with Locations((-52.5, -26.937205352), (-52.5, -39.937205352), (-6.5, -39.937205352), (-6.5, -26.937205352)):
            Hole(F_7_0_7_DIAMETER_HOLE1_D / 2, depth=F_7_0_7_DIAMETER_HOLE1_DEPTH)
            with Locations((0, 0, -(F_7_0_7_DIAMETER_HOLE1_DEPTH + F_7_0_7_DIAMETER_HOLE1_TIP / 2))):  # 118° drill point
                Cone(0, F_7_0_7_DIAMETER_HOLE1_D / 2, F_7_0_7_DIAMETER_HOLE1_TIP, mode=Mode.SUBTRACT)

    # Sketch13 → Boss-Extrude2 (add)
    with BuildSketch(Plane(origin=(20.060830656, 0, 0), x_dir=(0, 0, -1), z_dir=(1, 0, 0))):
        with Locations((-5, 3.922794648)):
            Rectangle(SKETCH13_W, SKETCH13_H)
        with Locations((-54, 3.922794648)):
            Rectangle(SKETCH13_W, SKETCH13_H)
    extrude(amount=BOSS_EXTRUDE2_DEPTH)

    # Sketch18 → Cut-Extrude4 (cut, through all)
    with BuildSketch(Plane(origin=(0, 0, 0), x_dir=(-1, 0, 0), z_dir=(0, 0, -1))):
        with Locations((-16.960830656, 31.612794648)):
            Rectangle(SKETCH18_W, SKETCH18_H)
    extrude(amount=-CUT_EXTRUDE4_DEPTH, mode=Mode.SUBTRACT)

    # Ø5.0 (5) Diameter Hole1
    with Locations(Plane(origin=(0, 28.162794648, 0), x_dir=(1, 0, 0), z_dir=(0, 1, 0))):
        with Locations((18.490830656, -5.94), (65.630830656, -5.94), (65.630830656, -53.06), (18.490830656, -53.06)):
            Hole(F_5_0_5_DIAMETER_HOLE1_D / 2, depth=F_5_0_5_DIAMETER_HOLE1_DEPTH)
            with Locations((0, 0, -(F_5_0_5_DIAMETER_HOLE1_DEPTH + F_5_0_5_DIAMETER_HOLE1_TIP / 2))):  # 118° drill point
                Cone(0, F_5_0_5_DIAMETER_HOLE1_D / 2, F_5_0_5_DIAMETER_HOLE1_TIP, mode=Mode.SUBTRACT)


solid = part.part
